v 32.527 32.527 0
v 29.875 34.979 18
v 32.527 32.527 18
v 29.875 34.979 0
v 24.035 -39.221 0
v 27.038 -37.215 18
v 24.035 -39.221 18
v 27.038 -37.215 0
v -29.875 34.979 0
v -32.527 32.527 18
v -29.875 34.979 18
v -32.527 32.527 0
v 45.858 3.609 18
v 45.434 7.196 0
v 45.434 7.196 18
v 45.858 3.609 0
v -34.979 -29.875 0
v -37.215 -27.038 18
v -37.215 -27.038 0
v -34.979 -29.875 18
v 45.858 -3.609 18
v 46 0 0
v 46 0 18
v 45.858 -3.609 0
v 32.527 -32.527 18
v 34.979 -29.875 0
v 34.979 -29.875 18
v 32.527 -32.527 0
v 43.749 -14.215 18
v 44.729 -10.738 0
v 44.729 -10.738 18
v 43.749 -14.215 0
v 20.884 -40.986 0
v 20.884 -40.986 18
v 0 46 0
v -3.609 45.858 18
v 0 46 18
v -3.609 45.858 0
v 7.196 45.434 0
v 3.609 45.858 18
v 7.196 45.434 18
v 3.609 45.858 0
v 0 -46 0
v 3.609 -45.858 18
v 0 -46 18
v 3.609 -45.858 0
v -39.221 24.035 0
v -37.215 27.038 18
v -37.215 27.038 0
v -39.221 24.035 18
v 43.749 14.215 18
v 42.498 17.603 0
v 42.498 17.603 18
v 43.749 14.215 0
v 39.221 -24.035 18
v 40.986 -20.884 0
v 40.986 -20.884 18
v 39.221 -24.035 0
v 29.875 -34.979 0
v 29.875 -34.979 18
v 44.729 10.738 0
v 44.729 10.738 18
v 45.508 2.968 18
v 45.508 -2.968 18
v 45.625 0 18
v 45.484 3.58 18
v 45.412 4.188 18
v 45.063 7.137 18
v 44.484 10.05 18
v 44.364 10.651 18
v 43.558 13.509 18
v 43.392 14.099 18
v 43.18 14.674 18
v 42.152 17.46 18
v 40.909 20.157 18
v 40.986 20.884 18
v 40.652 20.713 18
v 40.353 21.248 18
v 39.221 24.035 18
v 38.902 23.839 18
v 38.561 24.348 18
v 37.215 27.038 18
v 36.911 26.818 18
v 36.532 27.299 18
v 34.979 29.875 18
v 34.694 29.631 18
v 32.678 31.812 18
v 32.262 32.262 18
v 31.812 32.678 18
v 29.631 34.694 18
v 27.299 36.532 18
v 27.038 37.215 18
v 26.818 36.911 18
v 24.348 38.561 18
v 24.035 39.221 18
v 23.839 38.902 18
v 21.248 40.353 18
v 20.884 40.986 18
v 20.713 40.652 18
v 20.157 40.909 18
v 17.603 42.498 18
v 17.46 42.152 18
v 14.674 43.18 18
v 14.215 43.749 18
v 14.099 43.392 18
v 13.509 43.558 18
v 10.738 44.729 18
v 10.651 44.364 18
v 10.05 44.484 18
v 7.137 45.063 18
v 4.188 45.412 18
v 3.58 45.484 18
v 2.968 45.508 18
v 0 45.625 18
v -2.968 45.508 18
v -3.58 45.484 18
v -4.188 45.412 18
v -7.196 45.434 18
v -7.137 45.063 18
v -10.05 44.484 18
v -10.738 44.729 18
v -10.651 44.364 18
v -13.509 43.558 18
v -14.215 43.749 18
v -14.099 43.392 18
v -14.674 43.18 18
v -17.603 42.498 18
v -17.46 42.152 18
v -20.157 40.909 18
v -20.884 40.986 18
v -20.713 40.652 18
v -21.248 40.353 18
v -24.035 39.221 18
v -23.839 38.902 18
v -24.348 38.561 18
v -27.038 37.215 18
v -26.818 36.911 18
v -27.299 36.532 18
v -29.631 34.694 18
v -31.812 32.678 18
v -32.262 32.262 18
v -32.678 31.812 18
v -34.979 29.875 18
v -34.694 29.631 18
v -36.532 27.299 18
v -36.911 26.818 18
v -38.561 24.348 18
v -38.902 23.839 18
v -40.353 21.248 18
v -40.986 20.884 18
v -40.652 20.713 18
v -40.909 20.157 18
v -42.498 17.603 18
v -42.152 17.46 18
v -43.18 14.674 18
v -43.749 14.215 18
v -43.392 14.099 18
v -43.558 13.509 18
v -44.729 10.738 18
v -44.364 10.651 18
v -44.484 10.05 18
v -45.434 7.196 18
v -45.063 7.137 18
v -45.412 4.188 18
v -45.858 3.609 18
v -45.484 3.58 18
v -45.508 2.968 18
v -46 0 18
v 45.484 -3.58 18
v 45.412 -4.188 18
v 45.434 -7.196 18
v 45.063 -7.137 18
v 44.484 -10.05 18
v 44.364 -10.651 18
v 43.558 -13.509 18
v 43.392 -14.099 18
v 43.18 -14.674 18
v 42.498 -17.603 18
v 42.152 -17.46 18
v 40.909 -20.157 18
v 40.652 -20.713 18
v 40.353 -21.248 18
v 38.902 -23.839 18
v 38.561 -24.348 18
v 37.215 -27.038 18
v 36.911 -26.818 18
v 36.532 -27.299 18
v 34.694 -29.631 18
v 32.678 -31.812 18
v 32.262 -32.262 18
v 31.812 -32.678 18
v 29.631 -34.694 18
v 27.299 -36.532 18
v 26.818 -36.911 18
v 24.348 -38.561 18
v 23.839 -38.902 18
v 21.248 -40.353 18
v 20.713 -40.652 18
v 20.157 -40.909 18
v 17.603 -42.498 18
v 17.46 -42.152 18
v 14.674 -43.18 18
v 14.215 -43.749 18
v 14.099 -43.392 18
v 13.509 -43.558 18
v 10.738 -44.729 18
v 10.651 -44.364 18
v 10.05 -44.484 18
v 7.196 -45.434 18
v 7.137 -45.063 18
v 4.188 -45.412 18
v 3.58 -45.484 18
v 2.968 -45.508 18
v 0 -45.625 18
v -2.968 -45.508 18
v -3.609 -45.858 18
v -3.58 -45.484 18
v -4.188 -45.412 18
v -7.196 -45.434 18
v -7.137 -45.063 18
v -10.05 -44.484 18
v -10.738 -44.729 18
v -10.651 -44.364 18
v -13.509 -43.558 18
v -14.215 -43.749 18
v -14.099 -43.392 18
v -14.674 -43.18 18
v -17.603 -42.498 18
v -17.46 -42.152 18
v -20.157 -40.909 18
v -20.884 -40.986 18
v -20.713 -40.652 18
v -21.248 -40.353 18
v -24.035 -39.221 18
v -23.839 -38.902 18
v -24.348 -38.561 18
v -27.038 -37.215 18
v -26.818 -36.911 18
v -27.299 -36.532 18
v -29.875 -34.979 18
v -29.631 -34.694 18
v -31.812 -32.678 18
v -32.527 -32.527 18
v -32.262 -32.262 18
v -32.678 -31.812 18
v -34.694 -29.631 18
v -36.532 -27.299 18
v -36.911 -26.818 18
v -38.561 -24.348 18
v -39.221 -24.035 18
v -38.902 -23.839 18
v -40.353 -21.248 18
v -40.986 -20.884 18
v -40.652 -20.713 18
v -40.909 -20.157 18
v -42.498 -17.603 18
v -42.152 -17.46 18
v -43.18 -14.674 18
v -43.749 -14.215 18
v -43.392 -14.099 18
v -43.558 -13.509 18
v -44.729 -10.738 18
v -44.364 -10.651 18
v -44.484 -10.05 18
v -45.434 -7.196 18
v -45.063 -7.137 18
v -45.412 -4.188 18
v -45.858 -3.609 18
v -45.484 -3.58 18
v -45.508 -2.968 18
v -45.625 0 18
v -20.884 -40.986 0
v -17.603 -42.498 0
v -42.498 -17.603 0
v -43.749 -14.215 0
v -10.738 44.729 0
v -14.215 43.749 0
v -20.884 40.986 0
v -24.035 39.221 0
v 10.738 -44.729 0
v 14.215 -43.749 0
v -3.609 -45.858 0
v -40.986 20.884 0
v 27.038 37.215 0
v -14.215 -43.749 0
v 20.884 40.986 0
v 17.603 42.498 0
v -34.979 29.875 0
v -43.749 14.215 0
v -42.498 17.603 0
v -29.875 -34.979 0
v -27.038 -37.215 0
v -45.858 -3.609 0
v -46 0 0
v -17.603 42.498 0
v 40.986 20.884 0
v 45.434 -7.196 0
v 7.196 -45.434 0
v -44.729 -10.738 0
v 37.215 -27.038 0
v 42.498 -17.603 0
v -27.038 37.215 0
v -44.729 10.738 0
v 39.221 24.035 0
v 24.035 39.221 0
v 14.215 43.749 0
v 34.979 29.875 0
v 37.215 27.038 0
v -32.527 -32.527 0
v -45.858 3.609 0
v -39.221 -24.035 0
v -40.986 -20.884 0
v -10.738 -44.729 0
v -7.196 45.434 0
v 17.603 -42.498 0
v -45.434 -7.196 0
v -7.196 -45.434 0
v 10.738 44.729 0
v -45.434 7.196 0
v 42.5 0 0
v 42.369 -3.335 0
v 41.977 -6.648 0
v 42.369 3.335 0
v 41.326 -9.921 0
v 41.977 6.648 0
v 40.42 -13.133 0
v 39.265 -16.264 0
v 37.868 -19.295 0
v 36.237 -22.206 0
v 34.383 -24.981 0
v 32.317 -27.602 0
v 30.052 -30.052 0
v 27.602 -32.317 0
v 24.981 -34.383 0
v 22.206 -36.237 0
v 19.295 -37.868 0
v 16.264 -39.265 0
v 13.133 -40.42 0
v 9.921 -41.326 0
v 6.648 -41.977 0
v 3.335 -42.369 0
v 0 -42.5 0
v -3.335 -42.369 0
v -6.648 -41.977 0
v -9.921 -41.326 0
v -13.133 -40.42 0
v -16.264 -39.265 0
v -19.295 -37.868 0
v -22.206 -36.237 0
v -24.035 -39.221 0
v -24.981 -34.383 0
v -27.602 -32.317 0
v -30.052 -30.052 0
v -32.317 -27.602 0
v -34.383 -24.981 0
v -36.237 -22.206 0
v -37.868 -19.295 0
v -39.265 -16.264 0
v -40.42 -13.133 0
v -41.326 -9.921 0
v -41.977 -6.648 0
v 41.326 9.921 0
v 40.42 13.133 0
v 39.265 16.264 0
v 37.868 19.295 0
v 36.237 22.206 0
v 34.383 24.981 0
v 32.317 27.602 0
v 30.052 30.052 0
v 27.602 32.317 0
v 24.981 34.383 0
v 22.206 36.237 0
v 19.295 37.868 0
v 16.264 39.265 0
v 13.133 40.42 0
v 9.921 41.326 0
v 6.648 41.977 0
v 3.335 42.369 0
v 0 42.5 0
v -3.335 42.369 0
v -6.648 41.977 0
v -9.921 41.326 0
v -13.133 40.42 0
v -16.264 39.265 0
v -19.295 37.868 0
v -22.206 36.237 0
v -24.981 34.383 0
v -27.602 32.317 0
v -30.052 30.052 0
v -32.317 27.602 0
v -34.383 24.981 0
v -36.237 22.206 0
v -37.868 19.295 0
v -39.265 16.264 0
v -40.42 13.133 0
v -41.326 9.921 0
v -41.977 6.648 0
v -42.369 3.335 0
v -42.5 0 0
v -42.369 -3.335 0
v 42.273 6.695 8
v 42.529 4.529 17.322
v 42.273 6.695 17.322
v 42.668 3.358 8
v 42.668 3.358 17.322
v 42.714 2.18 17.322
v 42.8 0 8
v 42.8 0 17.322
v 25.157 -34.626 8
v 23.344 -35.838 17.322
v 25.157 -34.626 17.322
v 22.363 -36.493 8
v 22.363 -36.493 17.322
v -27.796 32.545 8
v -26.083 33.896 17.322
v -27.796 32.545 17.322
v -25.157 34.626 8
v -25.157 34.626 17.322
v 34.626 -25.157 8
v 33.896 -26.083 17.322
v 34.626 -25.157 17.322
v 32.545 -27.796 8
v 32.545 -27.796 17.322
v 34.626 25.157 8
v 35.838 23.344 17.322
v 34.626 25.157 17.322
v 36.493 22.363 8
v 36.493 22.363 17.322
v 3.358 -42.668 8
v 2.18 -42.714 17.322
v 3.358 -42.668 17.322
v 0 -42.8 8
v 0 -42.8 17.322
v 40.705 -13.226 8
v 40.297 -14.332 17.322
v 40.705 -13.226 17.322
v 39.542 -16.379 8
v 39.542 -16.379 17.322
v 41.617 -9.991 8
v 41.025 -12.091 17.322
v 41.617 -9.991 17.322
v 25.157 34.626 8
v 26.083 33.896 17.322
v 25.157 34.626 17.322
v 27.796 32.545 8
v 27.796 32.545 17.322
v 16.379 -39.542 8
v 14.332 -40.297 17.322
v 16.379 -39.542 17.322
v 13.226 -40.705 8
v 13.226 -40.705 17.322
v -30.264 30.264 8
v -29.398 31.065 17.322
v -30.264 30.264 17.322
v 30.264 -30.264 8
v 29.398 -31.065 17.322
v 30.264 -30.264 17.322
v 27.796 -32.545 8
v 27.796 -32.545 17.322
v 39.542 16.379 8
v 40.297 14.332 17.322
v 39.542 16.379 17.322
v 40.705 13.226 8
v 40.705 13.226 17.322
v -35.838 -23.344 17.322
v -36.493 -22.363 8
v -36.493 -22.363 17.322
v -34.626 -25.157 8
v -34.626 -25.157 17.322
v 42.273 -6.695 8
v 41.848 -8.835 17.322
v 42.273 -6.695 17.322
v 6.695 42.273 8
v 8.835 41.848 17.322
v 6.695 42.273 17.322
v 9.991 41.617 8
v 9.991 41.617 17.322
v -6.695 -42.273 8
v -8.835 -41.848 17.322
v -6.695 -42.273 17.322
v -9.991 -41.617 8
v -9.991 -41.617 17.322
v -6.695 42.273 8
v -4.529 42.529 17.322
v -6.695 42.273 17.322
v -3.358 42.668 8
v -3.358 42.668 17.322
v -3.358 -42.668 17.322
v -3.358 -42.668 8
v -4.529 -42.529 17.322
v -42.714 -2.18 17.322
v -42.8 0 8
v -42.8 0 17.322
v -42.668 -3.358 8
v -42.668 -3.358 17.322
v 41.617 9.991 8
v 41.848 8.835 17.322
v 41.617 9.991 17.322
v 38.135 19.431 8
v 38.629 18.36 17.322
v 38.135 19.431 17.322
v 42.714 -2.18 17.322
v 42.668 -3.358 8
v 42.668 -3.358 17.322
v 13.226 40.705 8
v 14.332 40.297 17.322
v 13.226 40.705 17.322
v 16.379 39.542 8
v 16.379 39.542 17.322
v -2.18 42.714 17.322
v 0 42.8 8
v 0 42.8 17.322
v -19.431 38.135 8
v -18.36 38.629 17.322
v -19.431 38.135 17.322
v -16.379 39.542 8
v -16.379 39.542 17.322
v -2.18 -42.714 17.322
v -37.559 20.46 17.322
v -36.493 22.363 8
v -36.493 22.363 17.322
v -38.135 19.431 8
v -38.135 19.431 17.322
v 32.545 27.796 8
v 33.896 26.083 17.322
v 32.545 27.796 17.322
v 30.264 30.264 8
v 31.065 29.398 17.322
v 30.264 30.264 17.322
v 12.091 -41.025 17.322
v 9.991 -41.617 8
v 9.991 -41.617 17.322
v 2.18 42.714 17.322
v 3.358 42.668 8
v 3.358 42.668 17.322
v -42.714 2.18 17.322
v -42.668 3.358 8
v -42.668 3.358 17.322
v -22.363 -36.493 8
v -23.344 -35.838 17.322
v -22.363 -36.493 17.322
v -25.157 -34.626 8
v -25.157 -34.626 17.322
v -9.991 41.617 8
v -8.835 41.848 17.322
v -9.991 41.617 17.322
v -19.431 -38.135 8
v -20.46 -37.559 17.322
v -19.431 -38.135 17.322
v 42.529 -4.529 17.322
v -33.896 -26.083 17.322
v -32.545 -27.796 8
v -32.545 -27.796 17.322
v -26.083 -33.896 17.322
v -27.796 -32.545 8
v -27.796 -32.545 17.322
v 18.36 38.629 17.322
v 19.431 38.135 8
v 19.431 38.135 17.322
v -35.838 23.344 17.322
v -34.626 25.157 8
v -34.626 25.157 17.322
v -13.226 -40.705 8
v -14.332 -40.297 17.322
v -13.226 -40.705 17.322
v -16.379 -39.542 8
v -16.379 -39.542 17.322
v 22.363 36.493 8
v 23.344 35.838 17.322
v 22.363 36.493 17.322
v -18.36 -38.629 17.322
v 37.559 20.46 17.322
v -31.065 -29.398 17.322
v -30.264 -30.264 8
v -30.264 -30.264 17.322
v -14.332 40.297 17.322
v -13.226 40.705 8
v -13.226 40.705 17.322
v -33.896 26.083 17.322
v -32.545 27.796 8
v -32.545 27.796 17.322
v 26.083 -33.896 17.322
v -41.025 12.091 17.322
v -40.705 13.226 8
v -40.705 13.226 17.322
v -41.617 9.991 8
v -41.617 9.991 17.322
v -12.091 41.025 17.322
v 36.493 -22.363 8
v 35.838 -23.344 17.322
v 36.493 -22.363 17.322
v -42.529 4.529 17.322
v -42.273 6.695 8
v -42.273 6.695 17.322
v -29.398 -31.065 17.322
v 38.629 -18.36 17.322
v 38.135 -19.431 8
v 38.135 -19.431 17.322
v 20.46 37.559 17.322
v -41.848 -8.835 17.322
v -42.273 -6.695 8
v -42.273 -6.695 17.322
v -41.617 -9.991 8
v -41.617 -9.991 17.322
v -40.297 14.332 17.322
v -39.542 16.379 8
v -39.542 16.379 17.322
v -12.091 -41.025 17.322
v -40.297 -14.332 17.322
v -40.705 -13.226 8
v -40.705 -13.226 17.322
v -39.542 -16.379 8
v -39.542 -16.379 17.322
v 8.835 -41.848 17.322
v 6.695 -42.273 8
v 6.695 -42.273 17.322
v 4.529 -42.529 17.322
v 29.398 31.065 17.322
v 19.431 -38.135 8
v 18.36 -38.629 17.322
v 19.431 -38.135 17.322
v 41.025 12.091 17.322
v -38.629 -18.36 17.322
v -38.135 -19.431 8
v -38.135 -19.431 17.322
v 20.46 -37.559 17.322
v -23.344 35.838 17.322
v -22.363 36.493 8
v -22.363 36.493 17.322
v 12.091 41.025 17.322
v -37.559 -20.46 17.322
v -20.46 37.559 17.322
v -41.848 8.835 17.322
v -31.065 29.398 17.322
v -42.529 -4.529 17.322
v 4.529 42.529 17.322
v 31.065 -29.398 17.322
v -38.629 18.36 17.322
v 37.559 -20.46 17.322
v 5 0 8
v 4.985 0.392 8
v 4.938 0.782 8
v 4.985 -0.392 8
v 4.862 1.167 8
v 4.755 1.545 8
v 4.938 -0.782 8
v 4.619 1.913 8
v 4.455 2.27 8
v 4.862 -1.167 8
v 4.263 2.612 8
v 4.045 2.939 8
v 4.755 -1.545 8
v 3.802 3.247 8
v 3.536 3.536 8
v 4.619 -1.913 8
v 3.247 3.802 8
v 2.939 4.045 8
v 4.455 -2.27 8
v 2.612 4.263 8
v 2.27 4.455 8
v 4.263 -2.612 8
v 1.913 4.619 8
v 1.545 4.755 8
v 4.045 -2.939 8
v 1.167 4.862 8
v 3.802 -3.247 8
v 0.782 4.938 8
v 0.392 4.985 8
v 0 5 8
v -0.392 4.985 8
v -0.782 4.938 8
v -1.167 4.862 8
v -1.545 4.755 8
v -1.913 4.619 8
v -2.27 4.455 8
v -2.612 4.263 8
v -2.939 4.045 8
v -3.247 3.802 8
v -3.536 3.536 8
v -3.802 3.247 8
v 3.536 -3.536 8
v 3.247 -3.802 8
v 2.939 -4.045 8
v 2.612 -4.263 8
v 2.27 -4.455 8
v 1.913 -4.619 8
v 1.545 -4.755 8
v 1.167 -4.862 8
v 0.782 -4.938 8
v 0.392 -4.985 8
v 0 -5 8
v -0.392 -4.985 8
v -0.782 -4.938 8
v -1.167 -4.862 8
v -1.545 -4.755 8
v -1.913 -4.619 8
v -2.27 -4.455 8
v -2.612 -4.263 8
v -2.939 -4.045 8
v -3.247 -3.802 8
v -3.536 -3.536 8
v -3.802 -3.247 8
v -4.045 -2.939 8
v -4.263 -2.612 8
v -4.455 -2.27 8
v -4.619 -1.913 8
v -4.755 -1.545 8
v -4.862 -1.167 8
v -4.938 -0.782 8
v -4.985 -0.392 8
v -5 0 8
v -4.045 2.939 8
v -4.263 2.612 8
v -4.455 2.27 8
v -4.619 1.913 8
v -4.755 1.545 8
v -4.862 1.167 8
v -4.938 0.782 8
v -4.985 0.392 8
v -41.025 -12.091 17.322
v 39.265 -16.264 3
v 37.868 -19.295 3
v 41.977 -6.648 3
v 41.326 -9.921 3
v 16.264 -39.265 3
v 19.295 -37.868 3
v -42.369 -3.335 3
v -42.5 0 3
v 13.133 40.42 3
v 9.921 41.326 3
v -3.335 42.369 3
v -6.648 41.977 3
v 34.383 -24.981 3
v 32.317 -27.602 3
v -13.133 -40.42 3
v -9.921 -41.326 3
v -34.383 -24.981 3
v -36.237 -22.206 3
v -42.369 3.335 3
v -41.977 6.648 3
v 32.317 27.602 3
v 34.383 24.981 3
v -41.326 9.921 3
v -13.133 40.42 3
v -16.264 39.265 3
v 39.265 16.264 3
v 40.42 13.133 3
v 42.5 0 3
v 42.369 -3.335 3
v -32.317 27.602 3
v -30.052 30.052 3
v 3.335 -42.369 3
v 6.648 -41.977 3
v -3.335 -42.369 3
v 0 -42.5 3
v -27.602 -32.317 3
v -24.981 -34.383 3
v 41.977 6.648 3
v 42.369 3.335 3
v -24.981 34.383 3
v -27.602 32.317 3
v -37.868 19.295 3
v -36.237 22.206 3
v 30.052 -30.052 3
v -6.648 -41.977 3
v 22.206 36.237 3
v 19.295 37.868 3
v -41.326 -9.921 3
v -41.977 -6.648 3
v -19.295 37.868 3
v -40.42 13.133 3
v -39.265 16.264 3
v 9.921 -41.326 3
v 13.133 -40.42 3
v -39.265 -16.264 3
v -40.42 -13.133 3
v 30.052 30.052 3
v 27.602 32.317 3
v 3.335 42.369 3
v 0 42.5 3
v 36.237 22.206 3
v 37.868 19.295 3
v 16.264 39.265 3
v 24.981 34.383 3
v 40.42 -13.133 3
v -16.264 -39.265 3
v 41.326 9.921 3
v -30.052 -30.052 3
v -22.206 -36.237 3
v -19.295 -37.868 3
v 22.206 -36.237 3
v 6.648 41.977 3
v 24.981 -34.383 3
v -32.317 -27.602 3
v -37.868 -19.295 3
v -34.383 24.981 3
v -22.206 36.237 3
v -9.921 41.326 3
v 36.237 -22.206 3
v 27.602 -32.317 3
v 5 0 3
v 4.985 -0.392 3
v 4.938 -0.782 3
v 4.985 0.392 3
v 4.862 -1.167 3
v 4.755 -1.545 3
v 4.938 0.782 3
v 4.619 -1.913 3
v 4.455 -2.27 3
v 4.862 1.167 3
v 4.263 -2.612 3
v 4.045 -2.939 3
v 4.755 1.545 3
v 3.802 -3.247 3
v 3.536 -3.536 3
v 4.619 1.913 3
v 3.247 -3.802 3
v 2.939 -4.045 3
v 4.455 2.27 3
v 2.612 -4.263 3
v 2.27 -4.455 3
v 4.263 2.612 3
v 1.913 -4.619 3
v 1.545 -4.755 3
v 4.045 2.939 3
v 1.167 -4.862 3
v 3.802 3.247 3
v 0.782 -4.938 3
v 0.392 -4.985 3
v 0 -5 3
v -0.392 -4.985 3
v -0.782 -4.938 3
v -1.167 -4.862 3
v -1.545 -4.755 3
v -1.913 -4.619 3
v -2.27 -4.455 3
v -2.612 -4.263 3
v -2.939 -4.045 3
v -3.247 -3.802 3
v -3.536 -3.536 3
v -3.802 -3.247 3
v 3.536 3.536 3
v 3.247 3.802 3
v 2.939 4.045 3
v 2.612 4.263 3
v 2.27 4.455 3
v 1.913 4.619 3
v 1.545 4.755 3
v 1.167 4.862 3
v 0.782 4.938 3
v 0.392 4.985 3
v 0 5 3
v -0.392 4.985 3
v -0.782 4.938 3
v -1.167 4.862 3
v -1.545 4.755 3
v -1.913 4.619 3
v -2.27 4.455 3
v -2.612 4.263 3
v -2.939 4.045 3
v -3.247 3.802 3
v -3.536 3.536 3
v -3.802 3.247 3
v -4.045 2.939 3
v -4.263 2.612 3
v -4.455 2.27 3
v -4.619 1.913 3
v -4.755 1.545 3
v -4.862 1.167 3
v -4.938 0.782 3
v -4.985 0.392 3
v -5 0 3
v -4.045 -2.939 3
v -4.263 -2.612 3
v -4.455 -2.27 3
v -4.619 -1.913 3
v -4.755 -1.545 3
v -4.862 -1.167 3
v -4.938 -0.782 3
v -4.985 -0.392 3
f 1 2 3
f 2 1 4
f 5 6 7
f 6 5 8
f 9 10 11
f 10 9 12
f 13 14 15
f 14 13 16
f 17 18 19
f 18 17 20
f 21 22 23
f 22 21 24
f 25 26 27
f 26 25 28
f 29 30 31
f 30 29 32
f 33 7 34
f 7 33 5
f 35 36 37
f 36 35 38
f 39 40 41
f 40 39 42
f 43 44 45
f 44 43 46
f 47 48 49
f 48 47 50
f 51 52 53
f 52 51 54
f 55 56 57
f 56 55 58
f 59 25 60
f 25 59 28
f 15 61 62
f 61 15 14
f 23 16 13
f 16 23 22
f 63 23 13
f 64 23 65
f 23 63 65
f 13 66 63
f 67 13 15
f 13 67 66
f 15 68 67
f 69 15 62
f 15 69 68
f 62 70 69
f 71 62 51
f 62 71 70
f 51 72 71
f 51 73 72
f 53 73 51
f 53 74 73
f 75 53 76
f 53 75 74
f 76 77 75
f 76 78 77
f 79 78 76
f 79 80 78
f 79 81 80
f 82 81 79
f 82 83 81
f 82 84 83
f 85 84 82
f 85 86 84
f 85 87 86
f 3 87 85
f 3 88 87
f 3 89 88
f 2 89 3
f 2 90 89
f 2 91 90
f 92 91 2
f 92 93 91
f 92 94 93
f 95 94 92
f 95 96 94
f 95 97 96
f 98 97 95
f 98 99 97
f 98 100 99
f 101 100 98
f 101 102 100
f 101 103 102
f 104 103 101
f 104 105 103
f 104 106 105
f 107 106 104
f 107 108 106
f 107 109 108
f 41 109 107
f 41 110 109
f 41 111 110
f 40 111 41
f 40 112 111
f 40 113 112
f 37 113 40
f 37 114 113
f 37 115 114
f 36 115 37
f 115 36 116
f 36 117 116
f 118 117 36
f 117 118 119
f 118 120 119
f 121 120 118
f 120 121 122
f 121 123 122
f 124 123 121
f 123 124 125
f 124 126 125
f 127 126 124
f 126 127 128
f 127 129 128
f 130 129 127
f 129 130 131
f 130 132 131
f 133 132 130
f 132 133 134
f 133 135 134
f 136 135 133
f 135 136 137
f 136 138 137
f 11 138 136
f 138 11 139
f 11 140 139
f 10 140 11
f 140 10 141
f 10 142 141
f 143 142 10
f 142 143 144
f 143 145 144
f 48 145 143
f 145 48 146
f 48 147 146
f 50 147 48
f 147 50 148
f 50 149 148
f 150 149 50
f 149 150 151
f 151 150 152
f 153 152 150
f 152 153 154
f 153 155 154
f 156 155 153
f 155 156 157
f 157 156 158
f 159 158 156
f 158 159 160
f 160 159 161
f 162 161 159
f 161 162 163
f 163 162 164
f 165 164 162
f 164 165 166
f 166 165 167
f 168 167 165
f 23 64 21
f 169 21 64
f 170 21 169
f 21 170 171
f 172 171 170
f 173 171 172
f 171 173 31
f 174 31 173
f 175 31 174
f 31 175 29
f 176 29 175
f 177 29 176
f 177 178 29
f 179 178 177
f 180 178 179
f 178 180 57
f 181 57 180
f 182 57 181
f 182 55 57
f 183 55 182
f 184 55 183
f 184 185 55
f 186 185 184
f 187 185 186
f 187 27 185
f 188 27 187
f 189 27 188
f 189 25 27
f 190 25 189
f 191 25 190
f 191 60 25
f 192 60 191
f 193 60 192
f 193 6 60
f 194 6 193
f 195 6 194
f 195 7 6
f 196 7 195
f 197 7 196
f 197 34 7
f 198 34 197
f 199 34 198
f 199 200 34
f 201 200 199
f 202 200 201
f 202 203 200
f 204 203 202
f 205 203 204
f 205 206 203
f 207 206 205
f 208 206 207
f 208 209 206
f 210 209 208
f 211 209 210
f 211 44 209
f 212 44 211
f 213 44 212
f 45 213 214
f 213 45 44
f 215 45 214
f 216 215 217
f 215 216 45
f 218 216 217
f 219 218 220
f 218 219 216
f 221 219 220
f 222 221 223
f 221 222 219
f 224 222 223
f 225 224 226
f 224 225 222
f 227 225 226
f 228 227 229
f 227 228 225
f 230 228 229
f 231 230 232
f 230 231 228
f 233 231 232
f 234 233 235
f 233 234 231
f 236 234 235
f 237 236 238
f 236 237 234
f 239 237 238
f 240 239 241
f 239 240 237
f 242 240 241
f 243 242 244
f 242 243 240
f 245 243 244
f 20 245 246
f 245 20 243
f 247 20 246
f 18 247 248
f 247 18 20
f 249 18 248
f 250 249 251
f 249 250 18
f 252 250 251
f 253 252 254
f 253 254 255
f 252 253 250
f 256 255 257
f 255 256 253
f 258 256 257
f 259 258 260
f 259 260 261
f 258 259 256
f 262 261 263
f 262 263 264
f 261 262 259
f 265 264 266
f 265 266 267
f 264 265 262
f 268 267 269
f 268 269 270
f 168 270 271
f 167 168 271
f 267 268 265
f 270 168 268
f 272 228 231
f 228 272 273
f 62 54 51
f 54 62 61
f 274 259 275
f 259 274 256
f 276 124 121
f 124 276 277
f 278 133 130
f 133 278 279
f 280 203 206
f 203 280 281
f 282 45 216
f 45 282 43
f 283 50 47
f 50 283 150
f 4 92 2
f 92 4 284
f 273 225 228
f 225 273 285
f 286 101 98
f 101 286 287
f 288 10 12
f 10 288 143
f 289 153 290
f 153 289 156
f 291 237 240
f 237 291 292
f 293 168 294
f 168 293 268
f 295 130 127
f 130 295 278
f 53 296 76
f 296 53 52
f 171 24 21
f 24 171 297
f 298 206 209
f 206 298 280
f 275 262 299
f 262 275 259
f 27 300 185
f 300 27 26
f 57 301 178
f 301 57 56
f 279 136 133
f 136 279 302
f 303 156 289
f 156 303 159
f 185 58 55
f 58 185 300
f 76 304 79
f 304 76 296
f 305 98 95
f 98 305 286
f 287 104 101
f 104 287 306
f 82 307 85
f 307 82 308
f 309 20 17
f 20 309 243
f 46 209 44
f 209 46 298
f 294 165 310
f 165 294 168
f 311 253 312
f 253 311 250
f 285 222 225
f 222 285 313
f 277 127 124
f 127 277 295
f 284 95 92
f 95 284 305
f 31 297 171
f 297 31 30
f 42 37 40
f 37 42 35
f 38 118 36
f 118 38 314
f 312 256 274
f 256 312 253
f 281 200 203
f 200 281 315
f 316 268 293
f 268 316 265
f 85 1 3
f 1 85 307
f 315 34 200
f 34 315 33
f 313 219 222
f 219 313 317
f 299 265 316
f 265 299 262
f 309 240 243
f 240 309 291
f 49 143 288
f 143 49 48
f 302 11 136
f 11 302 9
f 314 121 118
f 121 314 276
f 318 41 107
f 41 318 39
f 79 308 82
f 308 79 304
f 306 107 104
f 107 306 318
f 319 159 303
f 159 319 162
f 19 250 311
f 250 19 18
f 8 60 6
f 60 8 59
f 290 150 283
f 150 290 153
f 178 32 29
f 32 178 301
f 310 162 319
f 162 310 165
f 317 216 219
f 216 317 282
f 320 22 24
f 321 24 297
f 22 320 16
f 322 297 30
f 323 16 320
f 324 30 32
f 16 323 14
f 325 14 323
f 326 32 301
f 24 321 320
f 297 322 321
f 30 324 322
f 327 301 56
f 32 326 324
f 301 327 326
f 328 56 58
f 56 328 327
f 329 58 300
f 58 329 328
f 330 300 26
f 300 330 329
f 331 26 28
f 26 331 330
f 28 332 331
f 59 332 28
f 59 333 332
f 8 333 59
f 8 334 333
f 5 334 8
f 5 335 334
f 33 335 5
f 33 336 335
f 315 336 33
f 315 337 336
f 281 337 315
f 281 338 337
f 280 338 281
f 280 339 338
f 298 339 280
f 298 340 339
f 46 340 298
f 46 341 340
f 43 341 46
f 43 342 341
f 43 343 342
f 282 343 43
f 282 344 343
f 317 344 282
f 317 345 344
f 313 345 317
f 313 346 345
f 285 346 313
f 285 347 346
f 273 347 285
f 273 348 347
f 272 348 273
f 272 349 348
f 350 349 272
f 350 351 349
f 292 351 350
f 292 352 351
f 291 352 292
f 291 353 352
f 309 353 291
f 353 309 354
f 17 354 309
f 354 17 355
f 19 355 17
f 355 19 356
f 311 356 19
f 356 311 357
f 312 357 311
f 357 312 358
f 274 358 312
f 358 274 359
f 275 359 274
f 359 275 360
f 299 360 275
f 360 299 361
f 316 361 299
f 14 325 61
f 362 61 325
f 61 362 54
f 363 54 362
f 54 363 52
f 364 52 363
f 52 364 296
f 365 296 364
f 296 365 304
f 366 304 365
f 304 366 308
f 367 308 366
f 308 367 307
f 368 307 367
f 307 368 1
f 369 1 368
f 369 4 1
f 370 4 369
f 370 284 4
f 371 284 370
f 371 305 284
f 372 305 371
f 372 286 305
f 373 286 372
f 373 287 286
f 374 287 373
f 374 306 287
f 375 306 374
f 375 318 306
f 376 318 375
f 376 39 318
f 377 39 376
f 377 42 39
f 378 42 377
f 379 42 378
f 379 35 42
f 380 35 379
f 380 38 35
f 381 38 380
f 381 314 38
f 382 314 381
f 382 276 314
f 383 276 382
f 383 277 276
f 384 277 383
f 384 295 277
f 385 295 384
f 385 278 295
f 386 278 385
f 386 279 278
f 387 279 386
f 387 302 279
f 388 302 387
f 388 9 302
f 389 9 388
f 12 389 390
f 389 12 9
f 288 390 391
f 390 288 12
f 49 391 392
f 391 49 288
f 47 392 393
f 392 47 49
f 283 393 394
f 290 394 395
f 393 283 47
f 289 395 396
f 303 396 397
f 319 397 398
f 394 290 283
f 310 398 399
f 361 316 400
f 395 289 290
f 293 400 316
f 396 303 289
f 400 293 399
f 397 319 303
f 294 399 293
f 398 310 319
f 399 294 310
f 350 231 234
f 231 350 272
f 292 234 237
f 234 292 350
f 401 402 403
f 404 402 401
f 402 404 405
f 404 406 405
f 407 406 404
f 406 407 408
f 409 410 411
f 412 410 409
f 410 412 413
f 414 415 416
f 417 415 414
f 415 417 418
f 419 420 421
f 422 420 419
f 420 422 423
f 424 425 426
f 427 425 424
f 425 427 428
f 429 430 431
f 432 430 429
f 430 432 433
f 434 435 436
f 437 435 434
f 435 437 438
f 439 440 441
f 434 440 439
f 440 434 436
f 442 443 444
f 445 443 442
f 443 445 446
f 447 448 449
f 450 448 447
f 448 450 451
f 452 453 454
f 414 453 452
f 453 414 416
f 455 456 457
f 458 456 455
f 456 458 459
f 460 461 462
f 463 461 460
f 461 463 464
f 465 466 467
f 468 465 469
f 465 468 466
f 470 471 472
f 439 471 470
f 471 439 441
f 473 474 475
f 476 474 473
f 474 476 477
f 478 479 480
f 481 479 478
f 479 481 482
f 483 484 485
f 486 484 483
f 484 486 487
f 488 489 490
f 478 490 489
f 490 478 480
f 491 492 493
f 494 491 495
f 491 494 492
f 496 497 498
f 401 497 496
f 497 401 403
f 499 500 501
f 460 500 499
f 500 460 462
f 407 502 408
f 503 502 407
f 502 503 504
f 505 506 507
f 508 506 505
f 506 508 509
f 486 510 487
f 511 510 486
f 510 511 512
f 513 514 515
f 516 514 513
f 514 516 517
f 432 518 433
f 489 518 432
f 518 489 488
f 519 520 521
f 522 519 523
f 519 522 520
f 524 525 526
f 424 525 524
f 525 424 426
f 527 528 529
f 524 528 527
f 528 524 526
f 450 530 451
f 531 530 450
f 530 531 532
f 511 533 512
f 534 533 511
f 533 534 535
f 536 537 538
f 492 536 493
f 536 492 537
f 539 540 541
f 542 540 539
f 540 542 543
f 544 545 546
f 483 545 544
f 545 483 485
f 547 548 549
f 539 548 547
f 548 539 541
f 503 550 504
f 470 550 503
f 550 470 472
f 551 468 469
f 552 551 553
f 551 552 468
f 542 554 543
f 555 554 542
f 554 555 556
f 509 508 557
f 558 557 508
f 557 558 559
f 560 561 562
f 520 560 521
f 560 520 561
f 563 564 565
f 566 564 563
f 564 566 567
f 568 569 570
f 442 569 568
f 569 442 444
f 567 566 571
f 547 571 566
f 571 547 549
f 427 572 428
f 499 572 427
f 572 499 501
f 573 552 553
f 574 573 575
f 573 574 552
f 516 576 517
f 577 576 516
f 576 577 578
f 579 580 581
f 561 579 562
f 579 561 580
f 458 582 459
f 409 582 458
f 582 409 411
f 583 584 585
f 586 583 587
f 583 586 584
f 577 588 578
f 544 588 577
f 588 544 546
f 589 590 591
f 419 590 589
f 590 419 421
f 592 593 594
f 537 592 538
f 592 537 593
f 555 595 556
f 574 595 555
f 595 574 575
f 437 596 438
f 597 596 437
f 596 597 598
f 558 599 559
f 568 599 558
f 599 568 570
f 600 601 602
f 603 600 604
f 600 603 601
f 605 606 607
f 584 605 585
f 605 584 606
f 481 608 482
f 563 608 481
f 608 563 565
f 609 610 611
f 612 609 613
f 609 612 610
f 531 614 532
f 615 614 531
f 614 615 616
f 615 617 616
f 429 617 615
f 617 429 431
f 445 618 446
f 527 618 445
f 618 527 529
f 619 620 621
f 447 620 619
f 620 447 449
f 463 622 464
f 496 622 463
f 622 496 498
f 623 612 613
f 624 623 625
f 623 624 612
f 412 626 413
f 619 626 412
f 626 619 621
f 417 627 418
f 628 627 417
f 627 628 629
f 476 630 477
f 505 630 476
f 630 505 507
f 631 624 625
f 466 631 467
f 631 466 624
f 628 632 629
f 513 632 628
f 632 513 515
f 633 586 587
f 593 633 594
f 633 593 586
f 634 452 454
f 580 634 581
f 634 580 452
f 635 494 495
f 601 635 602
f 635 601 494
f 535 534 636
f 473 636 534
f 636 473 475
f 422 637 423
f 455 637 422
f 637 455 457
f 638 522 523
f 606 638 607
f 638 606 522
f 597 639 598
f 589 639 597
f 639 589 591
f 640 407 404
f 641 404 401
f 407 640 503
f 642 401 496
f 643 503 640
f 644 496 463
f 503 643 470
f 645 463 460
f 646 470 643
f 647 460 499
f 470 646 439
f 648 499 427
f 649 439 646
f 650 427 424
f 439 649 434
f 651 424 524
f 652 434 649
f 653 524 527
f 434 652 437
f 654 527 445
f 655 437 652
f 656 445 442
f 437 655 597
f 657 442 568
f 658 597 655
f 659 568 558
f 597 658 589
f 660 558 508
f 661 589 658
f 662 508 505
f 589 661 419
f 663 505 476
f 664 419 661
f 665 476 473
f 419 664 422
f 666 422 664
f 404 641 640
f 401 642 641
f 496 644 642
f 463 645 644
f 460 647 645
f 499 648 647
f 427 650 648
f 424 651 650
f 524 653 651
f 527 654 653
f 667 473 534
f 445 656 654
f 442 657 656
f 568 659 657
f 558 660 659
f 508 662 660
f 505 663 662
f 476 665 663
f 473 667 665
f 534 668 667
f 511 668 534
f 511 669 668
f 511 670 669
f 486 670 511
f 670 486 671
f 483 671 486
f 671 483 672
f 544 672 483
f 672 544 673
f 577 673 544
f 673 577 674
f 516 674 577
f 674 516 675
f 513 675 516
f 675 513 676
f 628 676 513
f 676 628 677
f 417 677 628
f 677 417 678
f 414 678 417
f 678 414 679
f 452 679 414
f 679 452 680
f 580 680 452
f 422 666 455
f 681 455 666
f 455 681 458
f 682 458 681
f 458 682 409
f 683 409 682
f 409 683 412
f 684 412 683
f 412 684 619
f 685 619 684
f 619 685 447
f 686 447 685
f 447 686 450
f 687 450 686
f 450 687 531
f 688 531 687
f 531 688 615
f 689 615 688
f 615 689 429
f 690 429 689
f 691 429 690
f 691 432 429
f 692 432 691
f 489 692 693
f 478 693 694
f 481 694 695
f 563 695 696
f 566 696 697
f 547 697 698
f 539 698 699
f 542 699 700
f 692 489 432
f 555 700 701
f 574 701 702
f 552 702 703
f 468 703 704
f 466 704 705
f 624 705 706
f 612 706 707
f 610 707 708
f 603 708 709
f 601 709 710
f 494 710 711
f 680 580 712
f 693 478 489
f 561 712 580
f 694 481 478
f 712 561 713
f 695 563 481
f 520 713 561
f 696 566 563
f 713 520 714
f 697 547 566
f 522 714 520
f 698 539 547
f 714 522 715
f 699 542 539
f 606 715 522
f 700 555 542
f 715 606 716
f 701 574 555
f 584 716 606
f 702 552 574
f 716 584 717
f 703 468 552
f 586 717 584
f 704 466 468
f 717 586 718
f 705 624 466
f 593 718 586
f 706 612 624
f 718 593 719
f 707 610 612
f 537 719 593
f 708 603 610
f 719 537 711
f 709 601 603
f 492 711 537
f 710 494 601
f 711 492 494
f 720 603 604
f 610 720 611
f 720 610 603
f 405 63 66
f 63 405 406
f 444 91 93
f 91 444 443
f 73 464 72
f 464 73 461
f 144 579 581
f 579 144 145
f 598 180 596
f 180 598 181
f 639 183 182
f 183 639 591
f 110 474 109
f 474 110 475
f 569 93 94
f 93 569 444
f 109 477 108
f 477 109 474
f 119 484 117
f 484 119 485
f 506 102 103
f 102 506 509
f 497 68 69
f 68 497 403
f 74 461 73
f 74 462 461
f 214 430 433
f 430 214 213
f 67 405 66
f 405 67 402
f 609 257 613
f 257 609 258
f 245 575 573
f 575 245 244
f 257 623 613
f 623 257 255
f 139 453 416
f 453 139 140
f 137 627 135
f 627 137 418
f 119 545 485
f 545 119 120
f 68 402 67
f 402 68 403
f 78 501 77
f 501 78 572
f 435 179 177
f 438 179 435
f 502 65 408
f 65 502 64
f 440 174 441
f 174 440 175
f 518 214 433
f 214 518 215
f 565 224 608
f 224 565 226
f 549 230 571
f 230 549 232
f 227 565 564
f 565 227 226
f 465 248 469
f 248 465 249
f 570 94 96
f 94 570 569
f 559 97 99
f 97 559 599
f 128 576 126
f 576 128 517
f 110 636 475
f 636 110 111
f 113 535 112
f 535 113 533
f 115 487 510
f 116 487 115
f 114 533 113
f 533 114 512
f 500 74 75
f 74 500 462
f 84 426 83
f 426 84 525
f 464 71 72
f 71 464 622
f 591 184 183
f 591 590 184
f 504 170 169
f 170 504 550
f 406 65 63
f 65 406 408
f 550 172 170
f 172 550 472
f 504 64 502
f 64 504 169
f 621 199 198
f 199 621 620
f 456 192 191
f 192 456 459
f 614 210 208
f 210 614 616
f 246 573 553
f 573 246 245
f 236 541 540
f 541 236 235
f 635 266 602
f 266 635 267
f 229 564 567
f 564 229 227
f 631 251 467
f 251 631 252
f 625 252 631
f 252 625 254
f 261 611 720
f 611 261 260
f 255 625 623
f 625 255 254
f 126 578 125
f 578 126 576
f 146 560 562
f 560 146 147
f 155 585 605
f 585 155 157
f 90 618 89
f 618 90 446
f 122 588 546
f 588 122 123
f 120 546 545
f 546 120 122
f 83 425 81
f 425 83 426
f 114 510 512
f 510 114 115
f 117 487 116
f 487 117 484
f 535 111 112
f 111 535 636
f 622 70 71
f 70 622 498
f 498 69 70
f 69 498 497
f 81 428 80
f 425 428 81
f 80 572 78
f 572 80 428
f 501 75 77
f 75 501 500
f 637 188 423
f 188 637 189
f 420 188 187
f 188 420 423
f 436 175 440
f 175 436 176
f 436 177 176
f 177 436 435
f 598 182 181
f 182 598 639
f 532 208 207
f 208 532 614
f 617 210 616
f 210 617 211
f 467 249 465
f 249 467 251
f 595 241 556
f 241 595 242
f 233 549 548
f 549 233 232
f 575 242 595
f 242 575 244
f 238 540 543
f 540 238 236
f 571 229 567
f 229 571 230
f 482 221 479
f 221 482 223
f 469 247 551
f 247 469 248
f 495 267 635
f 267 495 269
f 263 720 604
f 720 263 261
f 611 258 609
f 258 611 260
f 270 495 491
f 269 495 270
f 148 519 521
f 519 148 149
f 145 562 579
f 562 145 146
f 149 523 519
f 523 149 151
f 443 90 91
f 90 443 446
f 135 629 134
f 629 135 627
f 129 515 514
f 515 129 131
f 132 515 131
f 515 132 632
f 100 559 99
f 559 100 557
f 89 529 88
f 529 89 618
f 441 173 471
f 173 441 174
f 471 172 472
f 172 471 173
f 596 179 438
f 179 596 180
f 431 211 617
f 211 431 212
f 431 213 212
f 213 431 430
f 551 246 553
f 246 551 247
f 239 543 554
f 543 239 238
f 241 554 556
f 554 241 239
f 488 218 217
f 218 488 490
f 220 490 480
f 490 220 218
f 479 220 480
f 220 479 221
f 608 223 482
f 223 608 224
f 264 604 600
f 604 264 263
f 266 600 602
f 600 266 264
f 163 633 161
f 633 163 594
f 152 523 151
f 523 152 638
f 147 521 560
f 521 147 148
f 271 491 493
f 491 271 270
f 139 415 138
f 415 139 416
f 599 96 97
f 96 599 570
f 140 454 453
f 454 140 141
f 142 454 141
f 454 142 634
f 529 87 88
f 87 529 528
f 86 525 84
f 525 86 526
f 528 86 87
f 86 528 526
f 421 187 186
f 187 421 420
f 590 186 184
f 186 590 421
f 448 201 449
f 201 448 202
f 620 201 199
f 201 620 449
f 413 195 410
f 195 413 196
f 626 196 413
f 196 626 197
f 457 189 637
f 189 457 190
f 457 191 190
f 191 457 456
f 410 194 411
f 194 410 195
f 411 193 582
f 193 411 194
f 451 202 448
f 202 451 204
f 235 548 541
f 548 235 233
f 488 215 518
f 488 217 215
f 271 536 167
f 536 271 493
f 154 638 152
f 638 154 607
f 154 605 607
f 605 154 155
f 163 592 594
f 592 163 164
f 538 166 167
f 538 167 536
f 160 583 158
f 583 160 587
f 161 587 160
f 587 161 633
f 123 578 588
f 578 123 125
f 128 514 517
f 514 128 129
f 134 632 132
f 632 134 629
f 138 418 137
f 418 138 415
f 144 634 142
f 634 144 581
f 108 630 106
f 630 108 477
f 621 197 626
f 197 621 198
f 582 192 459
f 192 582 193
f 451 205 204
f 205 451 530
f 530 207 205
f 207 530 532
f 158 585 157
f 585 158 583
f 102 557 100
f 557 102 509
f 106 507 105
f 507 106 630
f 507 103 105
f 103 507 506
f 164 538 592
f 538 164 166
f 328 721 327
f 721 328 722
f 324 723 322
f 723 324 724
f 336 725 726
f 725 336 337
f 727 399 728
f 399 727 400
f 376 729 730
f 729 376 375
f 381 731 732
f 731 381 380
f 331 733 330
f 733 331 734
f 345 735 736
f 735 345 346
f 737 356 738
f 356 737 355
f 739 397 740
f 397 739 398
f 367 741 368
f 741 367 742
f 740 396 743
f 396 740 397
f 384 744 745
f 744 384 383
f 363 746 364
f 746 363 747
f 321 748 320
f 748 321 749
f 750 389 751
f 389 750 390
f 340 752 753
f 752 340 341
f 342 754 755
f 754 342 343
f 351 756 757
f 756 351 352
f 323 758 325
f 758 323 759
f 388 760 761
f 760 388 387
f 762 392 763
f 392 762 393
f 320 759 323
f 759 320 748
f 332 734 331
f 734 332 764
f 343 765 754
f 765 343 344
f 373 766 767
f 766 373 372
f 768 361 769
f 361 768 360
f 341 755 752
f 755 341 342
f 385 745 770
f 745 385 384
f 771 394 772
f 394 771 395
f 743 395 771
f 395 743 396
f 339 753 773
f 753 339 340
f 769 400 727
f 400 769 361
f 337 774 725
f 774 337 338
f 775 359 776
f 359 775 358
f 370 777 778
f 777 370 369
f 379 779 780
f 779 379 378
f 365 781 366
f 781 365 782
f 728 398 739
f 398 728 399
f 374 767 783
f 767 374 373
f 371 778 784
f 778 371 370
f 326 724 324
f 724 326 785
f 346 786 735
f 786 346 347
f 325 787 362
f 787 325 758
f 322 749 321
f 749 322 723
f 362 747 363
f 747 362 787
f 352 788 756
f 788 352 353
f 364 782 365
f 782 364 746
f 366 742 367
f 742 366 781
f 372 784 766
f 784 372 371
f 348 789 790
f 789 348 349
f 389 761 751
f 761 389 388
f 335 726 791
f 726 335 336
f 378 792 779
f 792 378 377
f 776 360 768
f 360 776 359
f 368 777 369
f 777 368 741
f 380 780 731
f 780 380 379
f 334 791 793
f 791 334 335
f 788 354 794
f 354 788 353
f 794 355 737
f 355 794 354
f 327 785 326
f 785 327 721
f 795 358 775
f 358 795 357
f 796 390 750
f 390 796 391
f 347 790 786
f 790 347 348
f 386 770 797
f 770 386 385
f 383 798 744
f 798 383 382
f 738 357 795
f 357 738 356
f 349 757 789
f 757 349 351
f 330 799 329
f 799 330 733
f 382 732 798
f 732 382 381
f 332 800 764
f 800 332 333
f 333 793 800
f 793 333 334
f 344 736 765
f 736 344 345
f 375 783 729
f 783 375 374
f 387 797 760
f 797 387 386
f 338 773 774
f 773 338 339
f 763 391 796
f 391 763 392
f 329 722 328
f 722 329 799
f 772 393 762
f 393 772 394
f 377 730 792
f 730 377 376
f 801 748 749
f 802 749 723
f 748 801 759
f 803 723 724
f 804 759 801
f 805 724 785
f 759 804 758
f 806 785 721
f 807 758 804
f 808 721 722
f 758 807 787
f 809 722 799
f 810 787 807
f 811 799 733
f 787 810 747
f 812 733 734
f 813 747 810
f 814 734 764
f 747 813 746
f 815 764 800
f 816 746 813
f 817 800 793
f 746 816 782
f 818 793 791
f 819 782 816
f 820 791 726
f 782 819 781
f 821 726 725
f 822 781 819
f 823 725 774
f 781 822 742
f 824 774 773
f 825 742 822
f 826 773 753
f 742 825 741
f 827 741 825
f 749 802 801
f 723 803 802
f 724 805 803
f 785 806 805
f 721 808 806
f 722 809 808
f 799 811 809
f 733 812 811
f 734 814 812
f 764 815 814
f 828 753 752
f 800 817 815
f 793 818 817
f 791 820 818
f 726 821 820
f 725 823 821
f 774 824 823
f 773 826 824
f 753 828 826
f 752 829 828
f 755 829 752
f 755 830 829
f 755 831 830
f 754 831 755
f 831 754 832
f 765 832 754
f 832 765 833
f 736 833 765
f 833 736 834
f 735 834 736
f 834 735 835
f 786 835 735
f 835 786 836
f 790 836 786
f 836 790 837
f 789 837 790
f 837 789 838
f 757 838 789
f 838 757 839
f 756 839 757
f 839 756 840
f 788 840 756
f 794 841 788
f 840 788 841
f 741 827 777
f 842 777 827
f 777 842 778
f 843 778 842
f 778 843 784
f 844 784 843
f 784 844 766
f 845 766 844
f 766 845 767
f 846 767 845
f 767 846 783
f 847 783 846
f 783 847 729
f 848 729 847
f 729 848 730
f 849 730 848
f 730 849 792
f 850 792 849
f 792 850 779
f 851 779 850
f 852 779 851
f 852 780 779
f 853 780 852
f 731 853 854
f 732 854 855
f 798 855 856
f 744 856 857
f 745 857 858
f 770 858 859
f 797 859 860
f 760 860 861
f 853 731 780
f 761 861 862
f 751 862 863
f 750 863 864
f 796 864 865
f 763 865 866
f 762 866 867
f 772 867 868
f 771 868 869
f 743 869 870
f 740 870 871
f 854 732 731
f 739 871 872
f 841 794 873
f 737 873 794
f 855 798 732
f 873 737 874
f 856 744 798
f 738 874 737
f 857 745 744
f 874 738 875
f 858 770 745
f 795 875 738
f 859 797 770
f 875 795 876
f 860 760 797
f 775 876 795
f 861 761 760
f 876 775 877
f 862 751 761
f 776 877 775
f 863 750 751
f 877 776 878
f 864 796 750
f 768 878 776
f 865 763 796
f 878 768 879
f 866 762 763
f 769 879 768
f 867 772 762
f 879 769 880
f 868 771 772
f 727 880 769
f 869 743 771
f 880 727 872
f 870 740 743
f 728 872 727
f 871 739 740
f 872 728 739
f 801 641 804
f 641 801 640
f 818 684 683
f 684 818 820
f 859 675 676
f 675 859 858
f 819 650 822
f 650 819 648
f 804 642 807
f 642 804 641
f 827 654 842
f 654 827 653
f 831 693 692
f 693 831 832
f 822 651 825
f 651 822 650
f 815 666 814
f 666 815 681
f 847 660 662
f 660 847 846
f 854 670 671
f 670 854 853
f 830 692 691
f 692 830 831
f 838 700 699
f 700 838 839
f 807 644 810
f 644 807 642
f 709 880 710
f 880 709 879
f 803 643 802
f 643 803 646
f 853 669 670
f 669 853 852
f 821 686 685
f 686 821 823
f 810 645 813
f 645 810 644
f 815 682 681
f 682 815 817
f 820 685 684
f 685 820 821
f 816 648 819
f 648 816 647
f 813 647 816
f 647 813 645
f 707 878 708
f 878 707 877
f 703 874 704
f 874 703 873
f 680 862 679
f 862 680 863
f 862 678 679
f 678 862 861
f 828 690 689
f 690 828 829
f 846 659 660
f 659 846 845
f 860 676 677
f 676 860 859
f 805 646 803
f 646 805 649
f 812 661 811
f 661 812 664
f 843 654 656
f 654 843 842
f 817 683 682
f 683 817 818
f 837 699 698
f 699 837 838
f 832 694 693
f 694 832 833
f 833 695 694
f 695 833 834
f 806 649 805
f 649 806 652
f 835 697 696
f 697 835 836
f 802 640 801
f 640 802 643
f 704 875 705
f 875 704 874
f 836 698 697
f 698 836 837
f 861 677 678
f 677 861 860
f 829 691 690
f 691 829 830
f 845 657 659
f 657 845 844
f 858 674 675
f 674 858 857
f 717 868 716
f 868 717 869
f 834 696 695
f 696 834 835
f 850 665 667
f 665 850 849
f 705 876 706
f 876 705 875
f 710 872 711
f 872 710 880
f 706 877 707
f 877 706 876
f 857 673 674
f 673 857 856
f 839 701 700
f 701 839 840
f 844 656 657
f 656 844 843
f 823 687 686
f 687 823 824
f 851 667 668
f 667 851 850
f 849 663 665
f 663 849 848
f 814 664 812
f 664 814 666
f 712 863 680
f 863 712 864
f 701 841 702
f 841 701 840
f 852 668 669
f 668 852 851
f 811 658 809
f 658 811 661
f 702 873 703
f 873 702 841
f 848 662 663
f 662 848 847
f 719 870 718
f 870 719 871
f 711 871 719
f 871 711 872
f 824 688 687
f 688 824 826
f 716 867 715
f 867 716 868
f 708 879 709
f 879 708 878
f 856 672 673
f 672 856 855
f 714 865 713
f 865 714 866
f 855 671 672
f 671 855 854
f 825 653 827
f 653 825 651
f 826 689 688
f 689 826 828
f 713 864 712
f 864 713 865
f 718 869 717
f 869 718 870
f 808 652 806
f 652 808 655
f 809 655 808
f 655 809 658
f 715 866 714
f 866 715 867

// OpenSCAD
// Cherry Pit Lid v004 - concave top and bottom
// Sits on standard coffee mug ~85mm outer rim diameter

$fn = 80;

mug_od      = 85;
clearance   = 0.6;
wall        = 3.5;
rim_depth   = 10;
lid_thick   = 8;
pit_hole_d  = 10;

outer_d = mug_od + wall * 2;
outer_r = outer_d / 2;

// Top bowl: spans full lid width, dips lid_thick-2mm
top_depth  = lid_thick - 2;
top_bowl_r = (outer_r * outer_r + top_depth * top_depth) / (2 * top_depth);

bot_recess_d = outer_d - wall * 2;  // recess inset from outer edge
bot_recess_h = 3;                    // depth of bottom recess

difference() {
    cylinder(d = outer_d, h = rim_depth + lid_thick);

    // Collar bore (fits over mug rim)
    translate([0, 0, lid_thick])
        cylinder(d = mug_od + clearance, h = rim_depth + 1);

    // Top concave bowl
    translate([0, 0, rim_depth + lid_thick + top_bowl_r - top_depth])
        sphere(r = top_bowl_r);

    // Bottom concave recess — leaves a rim ring on the underside
    translate([0, 0, -0.1])
        cylinder(d = bot_recess_d, h = bot_recess_h + 0.1);

    // Pit hole through center
    cylinder(d = pit_hole_d, h = rim_depth + lid_thick + 1);
}
